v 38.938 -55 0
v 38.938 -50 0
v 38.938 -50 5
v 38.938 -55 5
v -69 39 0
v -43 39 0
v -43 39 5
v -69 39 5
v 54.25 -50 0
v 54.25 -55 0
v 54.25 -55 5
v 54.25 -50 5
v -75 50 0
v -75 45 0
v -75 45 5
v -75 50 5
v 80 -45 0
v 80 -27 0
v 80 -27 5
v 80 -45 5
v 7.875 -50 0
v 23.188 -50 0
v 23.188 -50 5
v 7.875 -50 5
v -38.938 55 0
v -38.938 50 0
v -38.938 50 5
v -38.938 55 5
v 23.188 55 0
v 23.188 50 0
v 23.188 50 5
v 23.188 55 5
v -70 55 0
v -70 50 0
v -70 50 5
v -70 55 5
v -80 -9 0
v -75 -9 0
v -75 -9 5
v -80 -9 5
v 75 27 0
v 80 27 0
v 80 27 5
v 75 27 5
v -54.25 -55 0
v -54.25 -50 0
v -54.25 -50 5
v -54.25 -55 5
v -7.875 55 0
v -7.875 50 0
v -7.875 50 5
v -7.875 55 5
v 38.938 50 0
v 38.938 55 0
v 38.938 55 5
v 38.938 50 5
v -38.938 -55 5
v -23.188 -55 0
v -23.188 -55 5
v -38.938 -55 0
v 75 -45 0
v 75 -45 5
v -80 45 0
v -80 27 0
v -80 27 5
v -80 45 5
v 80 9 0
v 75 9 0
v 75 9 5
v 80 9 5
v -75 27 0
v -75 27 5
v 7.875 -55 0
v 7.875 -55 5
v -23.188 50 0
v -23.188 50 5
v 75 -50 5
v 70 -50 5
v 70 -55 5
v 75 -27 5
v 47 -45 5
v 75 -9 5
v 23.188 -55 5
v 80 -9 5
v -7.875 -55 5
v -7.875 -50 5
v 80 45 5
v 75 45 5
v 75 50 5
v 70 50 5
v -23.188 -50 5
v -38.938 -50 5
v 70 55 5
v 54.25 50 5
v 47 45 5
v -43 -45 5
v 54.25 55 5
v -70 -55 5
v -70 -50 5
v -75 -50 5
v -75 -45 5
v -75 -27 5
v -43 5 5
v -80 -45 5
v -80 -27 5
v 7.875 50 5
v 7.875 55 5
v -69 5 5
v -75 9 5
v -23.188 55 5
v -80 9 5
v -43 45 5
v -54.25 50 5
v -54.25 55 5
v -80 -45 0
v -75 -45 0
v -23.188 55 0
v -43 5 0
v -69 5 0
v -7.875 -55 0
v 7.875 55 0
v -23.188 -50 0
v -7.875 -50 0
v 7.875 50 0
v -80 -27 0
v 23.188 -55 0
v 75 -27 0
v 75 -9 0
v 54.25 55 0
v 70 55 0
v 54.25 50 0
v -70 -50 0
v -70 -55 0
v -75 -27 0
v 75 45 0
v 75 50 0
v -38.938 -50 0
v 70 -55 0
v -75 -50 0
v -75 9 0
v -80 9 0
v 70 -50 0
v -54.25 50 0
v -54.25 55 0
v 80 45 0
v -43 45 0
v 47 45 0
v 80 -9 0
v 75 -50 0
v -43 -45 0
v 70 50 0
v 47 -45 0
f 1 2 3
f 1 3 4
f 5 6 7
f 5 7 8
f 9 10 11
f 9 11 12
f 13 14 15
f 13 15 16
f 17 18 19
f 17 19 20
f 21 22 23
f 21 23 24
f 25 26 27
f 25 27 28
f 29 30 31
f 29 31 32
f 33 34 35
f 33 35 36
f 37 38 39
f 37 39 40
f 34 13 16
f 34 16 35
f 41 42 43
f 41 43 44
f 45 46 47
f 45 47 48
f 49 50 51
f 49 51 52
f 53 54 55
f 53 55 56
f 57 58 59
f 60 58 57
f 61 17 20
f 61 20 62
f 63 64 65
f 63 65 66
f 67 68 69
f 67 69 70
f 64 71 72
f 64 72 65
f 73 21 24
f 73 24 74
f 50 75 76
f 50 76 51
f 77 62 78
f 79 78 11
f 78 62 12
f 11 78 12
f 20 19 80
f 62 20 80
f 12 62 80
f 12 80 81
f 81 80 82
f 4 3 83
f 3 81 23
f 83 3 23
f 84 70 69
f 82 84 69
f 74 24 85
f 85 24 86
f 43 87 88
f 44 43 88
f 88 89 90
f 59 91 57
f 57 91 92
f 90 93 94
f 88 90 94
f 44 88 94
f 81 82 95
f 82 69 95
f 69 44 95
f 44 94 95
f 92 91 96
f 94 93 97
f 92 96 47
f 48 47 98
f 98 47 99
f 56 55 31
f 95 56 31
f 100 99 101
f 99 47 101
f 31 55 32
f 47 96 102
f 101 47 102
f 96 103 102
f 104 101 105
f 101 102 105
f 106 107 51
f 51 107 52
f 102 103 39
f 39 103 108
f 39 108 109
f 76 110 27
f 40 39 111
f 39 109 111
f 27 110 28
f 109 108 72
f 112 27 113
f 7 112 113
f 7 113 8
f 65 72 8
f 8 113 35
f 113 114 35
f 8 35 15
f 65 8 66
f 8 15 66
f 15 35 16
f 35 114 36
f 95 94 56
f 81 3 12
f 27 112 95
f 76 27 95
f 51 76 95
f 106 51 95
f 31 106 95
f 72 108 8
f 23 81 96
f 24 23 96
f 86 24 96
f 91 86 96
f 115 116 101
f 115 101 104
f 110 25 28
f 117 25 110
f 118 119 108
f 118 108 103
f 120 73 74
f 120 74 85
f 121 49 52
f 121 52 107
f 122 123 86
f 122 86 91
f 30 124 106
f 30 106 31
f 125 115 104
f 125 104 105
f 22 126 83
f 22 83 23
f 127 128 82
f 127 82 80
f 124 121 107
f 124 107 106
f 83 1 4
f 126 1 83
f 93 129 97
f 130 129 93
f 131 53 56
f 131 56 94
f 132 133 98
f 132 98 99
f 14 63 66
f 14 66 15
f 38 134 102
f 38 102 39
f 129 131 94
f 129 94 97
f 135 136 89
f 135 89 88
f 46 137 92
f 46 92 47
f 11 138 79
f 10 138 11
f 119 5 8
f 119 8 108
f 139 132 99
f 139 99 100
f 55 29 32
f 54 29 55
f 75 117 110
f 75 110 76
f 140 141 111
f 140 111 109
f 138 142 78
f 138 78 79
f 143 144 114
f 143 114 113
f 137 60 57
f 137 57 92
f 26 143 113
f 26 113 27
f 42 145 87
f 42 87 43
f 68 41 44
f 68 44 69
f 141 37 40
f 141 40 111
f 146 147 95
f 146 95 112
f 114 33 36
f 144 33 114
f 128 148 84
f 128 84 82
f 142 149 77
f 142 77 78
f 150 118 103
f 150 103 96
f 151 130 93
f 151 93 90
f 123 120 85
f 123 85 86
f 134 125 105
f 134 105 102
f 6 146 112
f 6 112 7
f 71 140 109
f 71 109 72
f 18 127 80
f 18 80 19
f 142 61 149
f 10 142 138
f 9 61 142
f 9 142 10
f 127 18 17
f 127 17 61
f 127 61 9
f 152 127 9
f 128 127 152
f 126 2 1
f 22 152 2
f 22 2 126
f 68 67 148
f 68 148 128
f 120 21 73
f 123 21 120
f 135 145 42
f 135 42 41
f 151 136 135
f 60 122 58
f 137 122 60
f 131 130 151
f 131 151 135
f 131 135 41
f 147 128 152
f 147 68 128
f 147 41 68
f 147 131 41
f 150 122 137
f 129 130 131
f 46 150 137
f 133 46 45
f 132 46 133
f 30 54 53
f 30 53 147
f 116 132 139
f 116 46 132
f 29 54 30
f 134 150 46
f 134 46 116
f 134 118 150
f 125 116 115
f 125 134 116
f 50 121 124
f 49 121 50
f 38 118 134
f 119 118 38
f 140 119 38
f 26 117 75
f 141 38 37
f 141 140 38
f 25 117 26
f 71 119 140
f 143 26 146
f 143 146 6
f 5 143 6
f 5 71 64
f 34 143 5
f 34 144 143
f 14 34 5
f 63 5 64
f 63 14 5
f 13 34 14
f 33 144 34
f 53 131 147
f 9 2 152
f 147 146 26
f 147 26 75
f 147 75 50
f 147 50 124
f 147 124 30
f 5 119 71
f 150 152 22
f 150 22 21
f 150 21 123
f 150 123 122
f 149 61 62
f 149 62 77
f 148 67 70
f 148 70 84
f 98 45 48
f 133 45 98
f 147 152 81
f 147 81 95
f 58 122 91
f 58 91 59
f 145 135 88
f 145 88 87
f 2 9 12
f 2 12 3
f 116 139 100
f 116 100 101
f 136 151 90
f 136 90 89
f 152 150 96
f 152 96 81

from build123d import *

# Parameters (mm, degrees)
BOSS_EXTRUDE1_DEPTH = 5
CUT_EXTRUDE1_DEPTH  = 6


with BuildPart() as part:
    # Sketch1 → Boss-Extrude1 (new body)
    with BuildSketch(Plane.XY):
        Polygon((-75, 50), (-70, 50), (-70, 55), (-54.25, 55), (-54.25, 50), (-38.9375, 50), (-38.9375, 55), (-23.1875, 55), (-23.1875, 50), (-7.875, 50), (-7.875, 55), (7.875, 55), (7.875, 50), (23.1875, 50), (23.1875, 55), (38.9375, 55), (38.9375, 50), (54.25, 50), (54.25, 55), (70, 55), (70, 50), (75, 50), (75, 45), (80, 45), (80, 27), (75, 27), (75, 9), (80, 9), (80, -9), (75, -9), (75, -27), (80, -27), (80, -45), (75, -45), (75, -50), (70, -50), (70, -55), (54.25, -55), (54.25, -50), (38.9375, -50), (38.9375, -55), (23.1875, -55), (23.1875, -50), (7.875, -50), (7.875, -55), (-7.875, -55), (-7.875, -50), (-23.1875, -50), (-23.1875, -55), (-38.9375, -55), (-38.9375, -50), (-54.25, -50), (-54.25, -55), (-70, -55), (-70, -50), (-75, -50), (-75, -45), (-80, -45), (-80, -27), (-75, -27), (-75, -9), (-80, -9), (-80, 9), (-75, 9), (-75, 27), (-80, 27), (-80, 45), (-75, 45), align=None)
    extrude(amount=BOSS_EXTRUDE1_DEPTH)

    # Sketch2 → Cut-Extrude1 (cut, through all)
    with BuildSketch(Plane(origin=(0, 0, 0), x_dir=(-1, 0, 0), z_dir=(0, 0, -1))):
        Polygon((-47, 45), (43, 45), (43, 39), (69, 39), (69, 5), (43, 5), (43, -45), (-47, -45), align=None)
    extrude(amount=-CUT_EXTRUDE1_DEPTH, mode=Mode.SUBTRACT)


solid = part.part
